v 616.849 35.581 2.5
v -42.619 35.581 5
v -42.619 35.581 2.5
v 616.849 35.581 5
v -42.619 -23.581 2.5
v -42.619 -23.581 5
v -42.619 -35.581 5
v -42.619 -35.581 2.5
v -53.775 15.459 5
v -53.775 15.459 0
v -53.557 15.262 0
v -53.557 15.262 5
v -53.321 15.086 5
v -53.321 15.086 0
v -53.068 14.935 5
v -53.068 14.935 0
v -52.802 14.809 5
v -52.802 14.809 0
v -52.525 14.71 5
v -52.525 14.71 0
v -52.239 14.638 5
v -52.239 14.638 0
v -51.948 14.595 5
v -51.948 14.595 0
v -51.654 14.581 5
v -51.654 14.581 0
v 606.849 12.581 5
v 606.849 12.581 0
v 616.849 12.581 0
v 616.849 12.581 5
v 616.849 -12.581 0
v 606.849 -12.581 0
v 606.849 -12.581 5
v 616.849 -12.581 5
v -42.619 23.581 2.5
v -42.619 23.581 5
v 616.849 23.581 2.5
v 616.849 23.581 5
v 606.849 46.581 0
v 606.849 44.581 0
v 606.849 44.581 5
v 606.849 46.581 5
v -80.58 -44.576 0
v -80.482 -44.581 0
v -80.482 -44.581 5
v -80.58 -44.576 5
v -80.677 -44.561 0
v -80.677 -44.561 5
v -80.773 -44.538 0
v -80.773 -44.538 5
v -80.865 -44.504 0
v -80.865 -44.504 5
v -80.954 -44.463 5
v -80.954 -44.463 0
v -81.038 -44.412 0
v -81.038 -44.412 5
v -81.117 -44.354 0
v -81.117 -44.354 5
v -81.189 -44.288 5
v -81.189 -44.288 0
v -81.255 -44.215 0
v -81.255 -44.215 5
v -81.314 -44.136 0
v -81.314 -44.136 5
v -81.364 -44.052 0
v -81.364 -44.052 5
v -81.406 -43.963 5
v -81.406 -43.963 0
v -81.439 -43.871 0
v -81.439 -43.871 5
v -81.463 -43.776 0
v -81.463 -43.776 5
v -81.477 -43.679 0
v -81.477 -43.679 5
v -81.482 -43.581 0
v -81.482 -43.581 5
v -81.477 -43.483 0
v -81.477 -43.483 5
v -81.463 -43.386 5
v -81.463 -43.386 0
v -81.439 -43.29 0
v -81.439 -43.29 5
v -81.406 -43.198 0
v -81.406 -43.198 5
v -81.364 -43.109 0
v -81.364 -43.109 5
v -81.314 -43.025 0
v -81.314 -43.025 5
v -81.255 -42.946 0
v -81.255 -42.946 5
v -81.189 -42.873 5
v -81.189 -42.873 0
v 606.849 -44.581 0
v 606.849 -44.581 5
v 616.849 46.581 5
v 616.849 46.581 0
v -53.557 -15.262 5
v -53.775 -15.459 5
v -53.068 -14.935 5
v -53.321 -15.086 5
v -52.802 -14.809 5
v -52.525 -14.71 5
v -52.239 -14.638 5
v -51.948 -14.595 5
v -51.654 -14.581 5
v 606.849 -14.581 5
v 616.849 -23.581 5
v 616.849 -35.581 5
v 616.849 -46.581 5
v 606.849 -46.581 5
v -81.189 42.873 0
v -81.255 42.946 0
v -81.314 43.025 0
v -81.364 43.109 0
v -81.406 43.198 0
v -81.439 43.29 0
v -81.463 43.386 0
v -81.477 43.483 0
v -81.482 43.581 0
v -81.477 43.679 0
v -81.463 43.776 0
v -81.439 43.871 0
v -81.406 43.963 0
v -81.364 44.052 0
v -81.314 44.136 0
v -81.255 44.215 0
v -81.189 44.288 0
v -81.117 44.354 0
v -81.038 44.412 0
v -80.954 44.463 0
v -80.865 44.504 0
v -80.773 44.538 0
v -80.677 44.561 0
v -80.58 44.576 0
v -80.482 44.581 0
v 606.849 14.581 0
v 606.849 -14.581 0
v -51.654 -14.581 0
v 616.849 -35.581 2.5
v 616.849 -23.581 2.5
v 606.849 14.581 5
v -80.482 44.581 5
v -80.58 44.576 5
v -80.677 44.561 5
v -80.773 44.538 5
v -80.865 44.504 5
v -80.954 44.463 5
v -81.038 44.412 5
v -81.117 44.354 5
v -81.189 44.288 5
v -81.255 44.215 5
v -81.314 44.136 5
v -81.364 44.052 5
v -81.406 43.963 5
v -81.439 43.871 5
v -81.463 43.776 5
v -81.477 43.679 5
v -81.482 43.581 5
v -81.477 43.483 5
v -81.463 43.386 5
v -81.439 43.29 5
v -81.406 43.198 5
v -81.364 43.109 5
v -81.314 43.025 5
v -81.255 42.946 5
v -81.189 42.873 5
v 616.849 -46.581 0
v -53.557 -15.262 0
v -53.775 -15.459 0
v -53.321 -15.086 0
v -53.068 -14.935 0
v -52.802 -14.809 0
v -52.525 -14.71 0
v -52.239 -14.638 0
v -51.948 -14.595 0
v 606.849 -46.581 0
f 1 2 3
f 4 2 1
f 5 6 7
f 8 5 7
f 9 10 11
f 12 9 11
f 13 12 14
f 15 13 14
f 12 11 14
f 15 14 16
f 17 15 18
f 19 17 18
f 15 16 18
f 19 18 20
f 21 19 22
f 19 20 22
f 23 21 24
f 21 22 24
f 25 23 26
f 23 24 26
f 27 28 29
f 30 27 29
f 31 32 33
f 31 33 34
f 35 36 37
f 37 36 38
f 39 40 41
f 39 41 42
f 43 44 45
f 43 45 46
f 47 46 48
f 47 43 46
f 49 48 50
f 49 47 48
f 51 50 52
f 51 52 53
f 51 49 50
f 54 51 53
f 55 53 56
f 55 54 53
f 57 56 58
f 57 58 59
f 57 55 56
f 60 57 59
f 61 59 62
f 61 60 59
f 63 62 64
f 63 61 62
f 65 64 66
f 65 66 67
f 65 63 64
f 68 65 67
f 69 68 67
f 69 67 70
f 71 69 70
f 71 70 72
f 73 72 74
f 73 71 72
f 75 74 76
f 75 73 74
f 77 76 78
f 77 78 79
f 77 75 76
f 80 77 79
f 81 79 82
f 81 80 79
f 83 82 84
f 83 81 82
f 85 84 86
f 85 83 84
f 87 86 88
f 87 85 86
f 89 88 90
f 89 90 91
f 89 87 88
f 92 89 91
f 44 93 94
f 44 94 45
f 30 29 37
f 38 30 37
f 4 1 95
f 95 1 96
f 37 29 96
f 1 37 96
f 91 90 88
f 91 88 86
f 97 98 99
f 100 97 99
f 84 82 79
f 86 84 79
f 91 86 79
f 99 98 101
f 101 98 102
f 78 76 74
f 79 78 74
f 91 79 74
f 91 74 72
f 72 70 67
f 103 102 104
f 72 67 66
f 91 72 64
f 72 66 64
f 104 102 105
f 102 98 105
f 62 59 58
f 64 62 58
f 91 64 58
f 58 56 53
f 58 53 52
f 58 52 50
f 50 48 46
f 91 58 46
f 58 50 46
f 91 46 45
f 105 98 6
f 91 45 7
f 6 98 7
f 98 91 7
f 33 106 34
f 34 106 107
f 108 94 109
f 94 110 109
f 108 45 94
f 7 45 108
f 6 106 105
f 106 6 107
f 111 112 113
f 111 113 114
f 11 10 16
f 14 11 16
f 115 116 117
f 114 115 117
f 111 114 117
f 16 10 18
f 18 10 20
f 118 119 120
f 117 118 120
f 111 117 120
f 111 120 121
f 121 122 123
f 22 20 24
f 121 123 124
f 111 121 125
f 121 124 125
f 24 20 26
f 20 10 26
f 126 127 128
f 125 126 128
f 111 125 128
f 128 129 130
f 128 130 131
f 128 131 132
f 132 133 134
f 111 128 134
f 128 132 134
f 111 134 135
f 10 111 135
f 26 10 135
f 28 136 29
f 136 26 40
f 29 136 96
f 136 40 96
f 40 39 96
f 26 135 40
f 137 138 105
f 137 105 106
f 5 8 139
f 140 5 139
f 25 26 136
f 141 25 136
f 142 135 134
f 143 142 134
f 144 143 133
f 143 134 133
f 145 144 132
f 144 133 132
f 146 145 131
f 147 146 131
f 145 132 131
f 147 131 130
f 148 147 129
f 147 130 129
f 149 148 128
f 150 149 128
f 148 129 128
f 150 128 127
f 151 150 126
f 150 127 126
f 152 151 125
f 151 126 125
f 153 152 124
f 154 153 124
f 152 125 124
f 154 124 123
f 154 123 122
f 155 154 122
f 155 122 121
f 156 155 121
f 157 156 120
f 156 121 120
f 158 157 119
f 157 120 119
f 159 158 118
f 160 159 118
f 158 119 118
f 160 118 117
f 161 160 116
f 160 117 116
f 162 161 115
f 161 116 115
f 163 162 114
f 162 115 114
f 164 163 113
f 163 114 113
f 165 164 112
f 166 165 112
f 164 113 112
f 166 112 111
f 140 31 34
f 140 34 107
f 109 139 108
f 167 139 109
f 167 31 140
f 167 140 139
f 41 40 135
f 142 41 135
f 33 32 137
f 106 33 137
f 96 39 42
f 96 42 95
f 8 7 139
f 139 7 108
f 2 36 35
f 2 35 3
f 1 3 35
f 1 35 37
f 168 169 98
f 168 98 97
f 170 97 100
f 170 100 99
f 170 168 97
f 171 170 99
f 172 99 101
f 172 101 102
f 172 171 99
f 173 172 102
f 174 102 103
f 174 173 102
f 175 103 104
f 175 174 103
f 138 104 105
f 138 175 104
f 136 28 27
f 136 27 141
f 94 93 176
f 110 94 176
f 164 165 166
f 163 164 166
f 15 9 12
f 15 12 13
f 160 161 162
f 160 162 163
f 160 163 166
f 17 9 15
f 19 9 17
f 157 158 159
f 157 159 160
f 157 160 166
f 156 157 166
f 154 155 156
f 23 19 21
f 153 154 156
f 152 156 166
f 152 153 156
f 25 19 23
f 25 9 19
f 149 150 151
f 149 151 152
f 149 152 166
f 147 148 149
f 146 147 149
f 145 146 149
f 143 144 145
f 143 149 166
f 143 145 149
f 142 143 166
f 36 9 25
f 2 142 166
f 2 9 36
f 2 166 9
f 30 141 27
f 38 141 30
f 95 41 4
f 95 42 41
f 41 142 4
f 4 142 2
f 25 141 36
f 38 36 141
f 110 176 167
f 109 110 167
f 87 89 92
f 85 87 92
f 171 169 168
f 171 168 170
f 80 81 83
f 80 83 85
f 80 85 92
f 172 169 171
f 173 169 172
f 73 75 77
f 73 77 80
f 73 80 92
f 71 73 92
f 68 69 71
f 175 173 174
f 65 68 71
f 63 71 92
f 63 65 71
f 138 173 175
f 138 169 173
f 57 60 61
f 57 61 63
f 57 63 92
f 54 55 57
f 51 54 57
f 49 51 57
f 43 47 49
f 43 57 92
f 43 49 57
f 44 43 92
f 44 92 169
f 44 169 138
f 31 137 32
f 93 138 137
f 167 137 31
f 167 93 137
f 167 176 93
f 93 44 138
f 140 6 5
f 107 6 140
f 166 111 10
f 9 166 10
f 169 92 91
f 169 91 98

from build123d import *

# Parameters (mm, degrees)
SKETCH_2_W          = 10
SKETCH_2_H          = 2
EXTRUDE_1_DEPTH     = 5
SKETCH_3_W          = 660
SKETCH_3_H          = 12
CUT_EXTRUDE_1_DEPTH = 2.5


with BuildPart() as part:
    # 草图2 → 凸台-拉伸1 (new body)
    with BuildSketch(Plane.XY):
        with BuildLine():
            ThreePointArc((-80.482238339, 44.580601224), (-81.406117872, 43.963284656), (-81.18934512, 42.873494443))
            Line((-81.18934512, 42.873494443), (-53.775131558, 15.45928088))
            ThreePointArc((-53.775131558, 15.45928088), (-52.801861511, 14.808962626), (-51.653811214, 14.580601224))
            Line((-51.653811214, 14.580601224), (606.848948473, 14.580601224))
            Line((606.848948473, 14.580601224), (616.848948473, 14.580601224))
            Line((616.848948473, 14.580601224), (616.848948473, 44.580601224))
            Line((616.848948473, 44.580601224), (606.848948473, 44.580601224))
            Line((606.848948473, 44.580601224), (-80.482238339, 44.580601224))
        make_face()
        with Locations((611.848948473, 45.580601224)):
            Rectangle(SKETCH_2_W, SKETCH_2_H)
        with Locations((611.848948473, 13.580601224)):
            Rectangle(SKETCH_2_W, SKETCH_2_H)
    extrude(amount=EXTRUDE_1_DEPTH)

    # 草图3 → 切除-拉伸1 (cut)
    with BuildSketch(Plane.XY.offset(5)):
        with Locations((287.380589783, 29.580601224)):
            Rectangle(SKETCH_3_W, SKETCH_3_H)
    extrude(amount=-CUT_EXTRUDE_1_DEPTH, mode=Mode.SUBTRACT)


with BuildPart() as body_2:
    # 镜向9: mirrored copy
    add(part.part.mirror(Plane.ZX))


solid = Compound([part.part, body_2.part])
